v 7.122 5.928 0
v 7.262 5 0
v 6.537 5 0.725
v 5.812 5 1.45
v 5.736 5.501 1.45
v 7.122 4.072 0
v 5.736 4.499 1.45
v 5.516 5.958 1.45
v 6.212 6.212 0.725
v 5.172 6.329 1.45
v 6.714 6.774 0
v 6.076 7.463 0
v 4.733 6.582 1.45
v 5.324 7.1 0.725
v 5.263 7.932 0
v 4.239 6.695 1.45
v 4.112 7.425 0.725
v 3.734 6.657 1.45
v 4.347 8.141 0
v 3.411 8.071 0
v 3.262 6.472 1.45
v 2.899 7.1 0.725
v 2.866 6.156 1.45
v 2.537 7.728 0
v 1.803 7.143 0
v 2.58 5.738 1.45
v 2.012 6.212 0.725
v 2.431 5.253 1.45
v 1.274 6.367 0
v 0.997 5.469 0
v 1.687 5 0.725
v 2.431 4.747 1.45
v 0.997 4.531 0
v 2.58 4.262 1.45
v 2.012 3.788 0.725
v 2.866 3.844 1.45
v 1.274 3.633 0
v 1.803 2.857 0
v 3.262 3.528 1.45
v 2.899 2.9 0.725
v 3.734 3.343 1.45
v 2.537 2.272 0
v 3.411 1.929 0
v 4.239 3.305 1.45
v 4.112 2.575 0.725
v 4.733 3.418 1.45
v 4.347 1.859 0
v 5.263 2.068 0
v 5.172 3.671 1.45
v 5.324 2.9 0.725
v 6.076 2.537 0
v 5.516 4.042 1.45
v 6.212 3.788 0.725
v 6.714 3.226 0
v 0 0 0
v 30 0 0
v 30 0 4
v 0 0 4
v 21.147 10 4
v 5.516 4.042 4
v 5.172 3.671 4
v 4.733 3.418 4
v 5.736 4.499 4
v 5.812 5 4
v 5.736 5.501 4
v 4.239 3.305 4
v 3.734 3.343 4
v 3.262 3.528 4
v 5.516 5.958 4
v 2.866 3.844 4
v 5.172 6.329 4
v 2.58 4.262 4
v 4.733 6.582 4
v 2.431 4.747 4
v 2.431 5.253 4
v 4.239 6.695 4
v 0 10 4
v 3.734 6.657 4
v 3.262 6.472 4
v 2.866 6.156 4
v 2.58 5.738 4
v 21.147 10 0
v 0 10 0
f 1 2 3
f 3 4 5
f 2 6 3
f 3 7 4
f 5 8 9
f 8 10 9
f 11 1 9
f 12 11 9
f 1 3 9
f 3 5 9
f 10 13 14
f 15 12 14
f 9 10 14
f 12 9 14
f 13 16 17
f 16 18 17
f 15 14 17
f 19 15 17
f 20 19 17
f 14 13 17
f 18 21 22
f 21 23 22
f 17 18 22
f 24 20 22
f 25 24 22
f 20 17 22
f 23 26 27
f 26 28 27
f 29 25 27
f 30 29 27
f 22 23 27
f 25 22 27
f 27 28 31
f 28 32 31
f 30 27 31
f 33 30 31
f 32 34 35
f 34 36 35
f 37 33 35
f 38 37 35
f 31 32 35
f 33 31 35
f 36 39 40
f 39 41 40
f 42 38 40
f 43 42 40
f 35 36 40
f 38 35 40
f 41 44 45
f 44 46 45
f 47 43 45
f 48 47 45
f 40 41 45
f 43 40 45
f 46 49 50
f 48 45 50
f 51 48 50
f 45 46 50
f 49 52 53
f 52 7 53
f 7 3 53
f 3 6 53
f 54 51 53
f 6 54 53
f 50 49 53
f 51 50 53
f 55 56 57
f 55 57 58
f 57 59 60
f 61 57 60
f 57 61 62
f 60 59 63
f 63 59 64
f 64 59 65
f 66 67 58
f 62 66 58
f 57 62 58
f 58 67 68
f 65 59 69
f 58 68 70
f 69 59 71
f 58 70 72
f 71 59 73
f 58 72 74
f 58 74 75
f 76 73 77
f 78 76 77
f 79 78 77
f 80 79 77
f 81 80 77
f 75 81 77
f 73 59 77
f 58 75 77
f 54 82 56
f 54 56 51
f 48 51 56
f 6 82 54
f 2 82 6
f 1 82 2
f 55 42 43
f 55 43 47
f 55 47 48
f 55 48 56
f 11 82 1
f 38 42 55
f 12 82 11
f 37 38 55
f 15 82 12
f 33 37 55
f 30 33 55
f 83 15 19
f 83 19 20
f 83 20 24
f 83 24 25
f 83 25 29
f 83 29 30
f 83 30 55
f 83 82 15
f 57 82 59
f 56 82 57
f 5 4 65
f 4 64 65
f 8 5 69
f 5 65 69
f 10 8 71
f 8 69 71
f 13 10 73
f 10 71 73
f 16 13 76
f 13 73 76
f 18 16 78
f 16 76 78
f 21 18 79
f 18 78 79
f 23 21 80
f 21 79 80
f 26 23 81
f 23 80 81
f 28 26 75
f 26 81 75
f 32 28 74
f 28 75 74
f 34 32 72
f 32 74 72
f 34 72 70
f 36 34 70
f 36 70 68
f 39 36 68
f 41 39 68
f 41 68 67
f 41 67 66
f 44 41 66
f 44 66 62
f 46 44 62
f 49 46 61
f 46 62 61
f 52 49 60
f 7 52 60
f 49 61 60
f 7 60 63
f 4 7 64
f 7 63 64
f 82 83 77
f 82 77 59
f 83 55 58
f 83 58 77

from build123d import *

# Parameters (mm, degrees)
EXTRUSION1_DEPTH                               = 4
FRAISAGE_POUR_VIS_T_TE_FRAIS_E_M31_D           = 3.4
FRAISAGE_POUR_VIS_T_TE_FRAIS_E_M31_CSINK_D     = 6.3
FRAISAGE_POUR_VIS_T_TE_FRAIS_E_M31_CSINK_ANGLE = 90


with BuildPart() as part:
    # Esquisse1 → Extrusion1 (new body)
    with BuildSketch(Plane.XY):
        Polygon((0, 0), (0, 10), (21.146637523, 10), (30, 0), align=None)
    extrude(amount=EXTRUSION1_DEPTH)

    # Fraisage pour vis à tête fraisée M31 (through all)
    with Locations(Plane(origin=(4.111822058, 5, 0), x_dir=(-1, 0, 0), z_dir=(0, 0, -1))):
        with Locations((0, 0)):
            CounterSinkHole(FRAISAGE_POUR_VIS_T_TE_FRAIS_E_M31_D / 2, FRAISAGE_POUR_VIS_T_TE_FRAIS_E_M31_CSINK_D / 2, counter_sink_angle=FRAISAGE_POUR_VIS_T_TE_FRAIS_E_M31_CSINK_ANGLE)


solid = part.part
